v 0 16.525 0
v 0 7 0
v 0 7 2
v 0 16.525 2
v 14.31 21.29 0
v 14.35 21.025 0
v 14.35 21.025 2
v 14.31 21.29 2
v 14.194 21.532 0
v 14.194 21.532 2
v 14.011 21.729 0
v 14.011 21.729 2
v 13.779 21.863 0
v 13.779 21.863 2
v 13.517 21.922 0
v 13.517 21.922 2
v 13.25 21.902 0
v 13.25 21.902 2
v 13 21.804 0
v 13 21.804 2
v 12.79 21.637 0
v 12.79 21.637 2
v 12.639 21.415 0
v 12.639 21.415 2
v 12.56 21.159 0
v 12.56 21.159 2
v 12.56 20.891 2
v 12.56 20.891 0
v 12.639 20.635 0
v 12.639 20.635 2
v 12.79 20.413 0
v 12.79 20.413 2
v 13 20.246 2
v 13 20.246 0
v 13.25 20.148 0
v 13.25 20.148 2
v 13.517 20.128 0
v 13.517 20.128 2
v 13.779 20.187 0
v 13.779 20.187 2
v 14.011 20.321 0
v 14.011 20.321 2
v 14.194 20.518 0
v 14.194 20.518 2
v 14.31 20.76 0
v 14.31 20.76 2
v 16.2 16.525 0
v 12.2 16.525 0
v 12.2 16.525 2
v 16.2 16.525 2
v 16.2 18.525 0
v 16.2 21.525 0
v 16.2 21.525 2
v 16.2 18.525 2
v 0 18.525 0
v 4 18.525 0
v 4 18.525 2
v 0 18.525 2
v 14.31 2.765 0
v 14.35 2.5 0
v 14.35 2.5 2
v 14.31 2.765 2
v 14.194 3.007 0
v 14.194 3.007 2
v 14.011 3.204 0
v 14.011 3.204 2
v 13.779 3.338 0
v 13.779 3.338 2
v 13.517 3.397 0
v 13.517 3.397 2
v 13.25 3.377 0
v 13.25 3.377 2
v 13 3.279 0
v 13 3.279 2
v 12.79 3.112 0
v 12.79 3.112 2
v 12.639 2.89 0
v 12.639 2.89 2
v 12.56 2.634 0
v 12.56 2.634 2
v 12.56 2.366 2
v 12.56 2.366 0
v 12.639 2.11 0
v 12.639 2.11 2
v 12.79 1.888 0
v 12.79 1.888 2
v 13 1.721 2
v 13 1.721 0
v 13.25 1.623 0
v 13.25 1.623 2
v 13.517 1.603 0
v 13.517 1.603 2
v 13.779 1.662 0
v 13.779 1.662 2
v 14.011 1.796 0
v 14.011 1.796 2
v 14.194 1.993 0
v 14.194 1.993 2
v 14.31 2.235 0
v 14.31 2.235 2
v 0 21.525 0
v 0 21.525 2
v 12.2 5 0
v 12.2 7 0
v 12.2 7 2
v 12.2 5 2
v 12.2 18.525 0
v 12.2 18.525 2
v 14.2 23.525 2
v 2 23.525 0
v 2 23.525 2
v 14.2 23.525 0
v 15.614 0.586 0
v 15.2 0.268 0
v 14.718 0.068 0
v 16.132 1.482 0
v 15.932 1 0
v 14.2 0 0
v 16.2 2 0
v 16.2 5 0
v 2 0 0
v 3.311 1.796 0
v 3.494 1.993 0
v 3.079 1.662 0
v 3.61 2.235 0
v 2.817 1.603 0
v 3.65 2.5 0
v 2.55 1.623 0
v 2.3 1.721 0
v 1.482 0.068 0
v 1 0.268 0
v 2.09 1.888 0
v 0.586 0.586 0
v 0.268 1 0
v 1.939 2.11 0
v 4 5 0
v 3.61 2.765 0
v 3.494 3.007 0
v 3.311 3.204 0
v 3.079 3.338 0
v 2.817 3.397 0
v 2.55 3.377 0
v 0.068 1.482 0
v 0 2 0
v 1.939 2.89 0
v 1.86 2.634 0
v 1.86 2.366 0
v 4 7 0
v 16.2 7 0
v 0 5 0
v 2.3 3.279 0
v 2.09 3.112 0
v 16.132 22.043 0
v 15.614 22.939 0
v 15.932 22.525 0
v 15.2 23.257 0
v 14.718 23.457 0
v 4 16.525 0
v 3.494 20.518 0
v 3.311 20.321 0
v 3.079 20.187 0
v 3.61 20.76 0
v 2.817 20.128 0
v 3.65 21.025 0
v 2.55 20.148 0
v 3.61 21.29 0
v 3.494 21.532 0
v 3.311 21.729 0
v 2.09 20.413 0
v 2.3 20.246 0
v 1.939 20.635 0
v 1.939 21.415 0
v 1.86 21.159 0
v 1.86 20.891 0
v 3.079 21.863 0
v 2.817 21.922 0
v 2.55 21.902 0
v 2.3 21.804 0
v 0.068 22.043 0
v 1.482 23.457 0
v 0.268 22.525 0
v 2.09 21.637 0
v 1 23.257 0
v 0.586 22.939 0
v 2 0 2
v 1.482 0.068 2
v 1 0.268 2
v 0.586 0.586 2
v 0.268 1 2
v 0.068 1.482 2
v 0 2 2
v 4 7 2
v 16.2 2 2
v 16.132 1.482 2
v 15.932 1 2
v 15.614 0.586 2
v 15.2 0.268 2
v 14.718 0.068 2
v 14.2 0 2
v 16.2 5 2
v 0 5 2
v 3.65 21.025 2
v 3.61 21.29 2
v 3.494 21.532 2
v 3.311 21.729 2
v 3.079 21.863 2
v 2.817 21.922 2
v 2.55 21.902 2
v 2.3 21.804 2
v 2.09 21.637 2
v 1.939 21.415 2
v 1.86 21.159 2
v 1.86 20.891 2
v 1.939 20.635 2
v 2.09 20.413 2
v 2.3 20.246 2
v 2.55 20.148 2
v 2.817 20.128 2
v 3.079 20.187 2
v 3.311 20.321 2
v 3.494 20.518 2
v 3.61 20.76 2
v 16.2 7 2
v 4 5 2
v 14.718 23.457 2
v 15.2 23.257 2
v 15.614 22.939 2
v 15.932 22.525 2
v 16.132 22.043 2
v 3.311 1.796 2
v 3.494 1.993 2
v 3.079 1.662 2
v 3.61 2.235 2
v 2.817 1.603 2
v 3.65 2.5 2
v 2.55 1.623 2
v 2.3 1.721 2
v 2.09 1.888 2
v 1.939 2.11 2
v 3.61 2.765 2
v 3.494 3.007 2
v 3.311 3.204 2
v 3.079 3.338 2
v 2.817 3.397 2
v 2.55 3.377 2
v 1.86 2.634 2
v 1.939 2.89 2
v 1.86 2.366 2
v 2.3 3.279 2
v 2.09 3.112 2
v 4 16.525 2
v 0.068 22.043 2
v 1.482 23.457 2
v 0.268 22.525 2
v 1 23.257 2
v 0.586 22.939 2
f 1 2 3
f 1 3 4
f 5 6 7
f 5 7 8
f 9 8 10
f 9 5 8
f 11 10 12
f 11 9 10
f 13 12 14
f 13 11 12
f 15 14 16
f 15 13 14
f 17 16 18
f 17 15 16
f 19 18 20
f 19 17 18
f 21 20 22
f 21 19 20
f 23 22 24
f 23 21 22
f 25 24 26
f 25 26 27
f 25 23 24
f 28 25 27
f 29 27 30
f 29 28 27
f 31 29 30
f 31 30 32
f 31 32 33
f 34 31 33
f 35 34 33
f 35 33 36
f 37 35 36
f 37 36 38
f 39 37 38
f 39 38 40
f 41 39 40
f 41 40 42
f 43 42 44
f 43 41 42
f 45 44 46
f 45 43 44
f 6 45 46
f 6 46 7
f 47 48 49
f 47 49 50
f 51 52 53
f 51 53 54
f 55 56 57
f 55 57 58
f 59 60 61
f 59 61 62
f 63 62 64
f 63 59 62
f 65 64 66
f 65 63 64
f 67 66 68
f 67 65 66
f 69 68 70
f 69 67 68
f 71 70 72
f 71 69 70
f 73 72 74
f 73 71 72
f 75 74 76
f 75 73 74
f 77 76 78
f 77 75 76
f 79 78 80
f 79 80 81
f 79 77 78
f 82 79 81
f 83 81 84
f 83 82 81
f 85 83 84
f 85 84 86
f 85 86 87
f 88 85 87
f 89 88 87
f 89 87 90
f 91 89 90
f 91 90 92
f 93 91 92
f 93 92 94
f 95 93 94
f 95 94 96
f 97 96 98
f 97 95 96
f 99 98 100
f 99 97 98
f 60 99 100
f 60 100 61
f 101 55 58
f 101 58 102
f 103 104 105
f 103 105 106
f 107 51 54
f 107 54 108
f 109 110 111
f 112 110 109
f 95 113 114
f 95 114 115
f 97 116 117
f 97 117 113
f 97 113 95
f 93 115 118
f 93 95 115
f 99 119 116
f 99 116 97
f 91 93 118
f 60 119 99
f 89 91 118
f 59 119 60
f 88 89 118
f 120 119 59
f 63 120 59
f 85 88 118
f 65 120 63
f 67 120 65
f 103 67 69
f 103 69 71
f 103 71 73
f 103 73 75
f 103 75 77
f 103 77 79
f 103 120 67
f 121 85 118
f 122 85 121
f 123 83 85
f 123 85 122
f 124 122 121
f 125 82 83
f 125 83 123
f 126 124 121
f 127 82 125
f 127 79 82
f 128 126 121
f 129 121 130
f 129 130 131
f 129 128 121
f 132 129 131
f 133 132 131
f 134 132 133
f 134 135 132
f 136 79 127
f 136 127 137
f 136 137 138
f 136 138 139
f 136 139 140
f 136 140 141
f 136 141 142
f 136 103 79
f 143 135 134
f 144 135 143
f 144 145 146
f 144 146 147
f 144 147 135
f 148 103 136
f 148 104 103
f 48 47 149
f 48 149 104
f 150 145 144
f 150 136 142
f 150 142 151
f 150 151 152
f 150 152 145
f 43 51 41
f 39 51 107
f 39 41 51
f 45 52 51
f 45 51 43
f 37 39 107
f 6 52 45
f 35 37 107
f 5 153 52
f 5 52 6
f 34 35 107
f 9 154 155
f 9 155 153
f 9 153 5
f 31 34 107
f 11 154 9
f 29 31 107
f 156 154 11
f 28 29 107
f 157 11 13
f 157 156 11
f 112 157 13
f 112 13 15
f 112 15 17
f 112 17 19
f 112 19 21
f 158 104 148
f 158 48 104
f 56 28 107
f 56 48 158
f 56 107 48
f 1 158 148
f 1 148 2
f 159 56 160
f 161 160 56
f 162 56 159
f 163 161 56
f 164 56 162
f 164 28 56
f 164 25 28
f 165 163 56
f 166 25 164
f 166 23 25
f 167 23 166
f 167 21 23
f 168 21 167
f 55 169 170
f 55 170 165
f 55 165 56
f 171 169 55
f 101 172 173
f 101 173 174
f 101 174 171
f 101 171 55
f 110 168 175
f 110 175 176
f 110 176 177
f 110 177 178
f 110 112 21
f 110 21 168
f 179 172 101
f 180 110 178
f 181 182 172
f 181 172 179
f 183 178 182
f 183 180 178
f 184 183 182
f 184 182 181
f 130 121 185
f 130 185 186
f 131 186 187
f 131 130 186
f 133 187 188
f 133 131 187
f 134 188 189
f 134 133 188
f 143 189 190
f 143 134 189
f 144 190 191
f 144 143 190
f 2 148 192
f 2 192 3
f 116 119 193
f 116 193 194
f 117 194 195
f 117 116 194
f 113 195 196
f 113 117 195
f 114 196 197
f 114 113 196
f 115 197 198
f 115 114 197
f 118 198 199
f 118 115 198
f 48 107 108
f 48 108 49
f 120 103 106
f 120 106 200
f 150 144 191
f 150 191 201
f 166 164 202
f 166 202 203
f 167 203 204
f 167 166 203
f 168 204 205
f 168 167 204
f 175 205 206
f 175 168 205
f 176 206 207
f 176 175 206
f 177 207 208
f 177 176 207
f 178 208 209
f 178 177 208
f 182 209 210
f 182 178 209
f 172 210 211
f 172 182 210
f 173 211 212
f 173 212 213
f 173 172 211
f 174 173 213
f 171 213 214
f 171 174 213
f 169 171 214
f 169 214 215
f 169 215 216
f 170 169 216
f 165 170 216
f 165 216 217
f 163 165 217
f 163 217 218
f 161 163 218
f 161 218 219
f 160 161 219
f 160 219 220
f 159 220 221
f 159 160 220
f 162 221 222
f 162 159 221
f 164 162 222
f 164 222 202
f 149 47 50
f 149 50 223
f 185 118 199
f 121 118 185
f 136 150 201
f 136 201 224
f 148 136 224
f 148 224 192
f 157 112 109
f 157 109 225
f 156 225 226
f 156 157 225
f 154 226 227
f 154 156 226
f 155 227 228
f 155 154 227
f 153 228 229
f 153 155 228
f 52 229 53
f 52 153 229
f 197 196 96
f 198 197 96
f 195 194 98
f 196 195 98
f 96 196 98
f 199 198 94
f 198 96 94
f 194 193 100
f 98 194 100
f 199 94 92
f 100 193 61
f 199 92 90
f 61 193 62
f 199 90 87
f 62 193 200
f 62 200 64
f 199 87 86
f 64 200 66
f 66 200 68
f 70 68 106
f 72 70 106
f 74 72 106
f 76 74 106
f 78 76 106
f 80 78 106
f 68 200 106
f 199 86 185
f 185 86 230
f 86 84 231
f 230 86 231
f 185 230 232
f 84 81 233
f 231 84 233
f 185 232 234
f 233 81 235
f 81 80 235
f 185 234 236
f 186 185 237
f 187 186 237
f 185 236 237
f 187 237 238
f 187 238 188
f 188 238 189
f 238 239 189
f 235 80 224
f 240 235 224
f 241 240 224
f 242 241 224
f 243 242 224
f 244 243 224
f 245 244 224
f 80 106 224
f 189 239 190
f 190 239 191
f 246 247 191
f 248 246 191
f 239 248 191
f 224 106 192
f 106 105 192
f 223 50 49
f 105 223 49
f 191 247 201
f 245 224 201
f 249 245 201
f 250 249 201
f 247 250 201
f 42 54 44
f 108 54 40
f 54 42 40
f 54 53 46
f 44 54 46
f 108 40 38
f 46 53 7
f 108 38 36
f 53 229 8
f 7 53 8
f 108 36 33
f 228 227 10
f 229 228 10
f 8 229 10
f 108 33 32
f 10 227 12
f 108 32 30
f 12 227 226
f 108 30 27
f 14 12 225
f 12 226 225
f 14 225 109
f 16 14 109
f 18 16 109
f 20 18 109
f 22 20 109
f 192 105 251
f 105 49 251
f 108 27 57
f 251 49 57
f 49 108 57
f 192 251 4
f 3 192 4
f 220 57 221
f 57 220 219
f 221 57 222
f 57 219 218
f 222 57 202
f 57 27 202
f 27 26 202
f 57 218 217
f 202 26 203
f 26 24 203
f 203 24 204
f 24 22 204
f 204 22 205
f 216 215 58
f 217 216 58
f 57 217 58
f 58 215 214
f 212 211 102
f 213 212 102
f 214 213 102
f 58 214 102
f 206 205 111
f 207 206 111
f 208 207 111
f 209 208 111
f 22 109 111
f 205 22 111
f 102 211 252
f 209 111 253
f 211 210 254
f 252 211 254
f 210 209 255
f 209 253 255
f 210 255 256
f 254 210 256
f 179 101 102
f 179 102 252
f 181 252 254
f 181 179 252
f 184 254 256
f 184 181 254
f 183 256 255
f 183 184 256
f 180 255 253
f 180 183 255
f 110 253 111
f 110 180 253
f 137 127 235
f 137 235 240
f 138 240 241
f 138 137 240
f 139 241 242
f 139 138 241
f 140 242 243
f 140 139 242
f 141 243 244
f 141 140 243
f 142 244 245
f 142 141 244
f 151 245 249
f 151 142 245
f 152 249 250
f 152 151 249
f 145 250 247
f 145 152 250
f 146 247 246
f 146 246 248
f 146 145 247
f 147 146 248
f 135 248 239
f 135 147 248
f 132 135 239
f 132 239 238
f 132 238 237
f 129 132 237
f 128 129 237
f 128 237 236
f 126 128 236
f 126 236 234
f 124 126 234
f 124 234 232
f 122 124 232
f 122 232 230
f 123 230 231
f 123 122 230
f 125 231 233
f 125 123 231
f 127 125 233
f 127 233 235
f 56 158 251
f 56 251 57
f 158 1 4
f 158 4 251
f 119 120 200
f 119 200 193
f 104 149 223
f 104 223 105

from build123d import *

# Parameters (mm, degrees)
SKETCH1_R           = 0.9
BOSS_EXTRUDE1_DEPTH = 2


with BuildPart() as part:
    # Sketch1 → Boss-Extrude1 (new body)
    with BuildSketch(Plane.XY):
        with BuildLine():
            Line((16.2, 5), (16.2, 2))
            ThreePointArc((16.2, 2), (15.614213562, 0.585786438), (14.2, 0))
            Line((14.2, 0), (2, 0))
            ThreePointArc((2, 0), (0.585786438, 0.585786438), (0, 2))
            Line((0, 2), (0, 5))
            Line((0, 5), (4, 5))
            Line((4, 5), (4, 7))
            Line((4, 7), (0, 7))
            Line((0, 7), (0, 16.525))
            Line((0, 16.525), (4, 16.525))
            Line((4, 16.525), (4, 18.525))
            Line((4, 18.525), (0, 18.525))
            Line((0, 18.525), (0, 21.525))
            ThreePointArc((0, 21.525), (0.585786438, 22.939213562), (2, 23.525))
            Line((2, 23.525), (14.2, 23.525))
            ThreePointArc((14.2, 23.525), (15.614213562, 22.939213562), (16.2, 21.525))
            Line((16.2, 21.525), (16.2, 18.525))
            Line((16.2, 18.525), (12.2, 18.525))
            Line((12.2, 18.525), (12.2, 16.525))
            Line((12.2, 16.525), (16.2, 16.525))
            Line((16.2, 16.525), (16.2, 7))
            Line((16.2, 7), (12.2, 7))
            Line((12.2, 7), (12.2, 5))
            Line((12.2, 5), (16.2, 5))
        make_face()
        with Locations((13.45, 2.5)):
            Circle(SKETCH1_R, mode=Mode.SUBTRACT)
        with Locations((2.75, 21.025)):
            Circle(SKETCH1_R, mode=Mode.SUBTRACT)
        with Locations((13.45, 21.025)):
            Circle(SKETCH1_R, mode=Mode.SUBTRACT)
        with Locations((2.75, 2.5)):
            Circle(SKETCH1_R, mode=Mode.SUBTRACT)
    extrude(amount=BOSS_EXTRUDE1_DEPTH)


solid = part.part
